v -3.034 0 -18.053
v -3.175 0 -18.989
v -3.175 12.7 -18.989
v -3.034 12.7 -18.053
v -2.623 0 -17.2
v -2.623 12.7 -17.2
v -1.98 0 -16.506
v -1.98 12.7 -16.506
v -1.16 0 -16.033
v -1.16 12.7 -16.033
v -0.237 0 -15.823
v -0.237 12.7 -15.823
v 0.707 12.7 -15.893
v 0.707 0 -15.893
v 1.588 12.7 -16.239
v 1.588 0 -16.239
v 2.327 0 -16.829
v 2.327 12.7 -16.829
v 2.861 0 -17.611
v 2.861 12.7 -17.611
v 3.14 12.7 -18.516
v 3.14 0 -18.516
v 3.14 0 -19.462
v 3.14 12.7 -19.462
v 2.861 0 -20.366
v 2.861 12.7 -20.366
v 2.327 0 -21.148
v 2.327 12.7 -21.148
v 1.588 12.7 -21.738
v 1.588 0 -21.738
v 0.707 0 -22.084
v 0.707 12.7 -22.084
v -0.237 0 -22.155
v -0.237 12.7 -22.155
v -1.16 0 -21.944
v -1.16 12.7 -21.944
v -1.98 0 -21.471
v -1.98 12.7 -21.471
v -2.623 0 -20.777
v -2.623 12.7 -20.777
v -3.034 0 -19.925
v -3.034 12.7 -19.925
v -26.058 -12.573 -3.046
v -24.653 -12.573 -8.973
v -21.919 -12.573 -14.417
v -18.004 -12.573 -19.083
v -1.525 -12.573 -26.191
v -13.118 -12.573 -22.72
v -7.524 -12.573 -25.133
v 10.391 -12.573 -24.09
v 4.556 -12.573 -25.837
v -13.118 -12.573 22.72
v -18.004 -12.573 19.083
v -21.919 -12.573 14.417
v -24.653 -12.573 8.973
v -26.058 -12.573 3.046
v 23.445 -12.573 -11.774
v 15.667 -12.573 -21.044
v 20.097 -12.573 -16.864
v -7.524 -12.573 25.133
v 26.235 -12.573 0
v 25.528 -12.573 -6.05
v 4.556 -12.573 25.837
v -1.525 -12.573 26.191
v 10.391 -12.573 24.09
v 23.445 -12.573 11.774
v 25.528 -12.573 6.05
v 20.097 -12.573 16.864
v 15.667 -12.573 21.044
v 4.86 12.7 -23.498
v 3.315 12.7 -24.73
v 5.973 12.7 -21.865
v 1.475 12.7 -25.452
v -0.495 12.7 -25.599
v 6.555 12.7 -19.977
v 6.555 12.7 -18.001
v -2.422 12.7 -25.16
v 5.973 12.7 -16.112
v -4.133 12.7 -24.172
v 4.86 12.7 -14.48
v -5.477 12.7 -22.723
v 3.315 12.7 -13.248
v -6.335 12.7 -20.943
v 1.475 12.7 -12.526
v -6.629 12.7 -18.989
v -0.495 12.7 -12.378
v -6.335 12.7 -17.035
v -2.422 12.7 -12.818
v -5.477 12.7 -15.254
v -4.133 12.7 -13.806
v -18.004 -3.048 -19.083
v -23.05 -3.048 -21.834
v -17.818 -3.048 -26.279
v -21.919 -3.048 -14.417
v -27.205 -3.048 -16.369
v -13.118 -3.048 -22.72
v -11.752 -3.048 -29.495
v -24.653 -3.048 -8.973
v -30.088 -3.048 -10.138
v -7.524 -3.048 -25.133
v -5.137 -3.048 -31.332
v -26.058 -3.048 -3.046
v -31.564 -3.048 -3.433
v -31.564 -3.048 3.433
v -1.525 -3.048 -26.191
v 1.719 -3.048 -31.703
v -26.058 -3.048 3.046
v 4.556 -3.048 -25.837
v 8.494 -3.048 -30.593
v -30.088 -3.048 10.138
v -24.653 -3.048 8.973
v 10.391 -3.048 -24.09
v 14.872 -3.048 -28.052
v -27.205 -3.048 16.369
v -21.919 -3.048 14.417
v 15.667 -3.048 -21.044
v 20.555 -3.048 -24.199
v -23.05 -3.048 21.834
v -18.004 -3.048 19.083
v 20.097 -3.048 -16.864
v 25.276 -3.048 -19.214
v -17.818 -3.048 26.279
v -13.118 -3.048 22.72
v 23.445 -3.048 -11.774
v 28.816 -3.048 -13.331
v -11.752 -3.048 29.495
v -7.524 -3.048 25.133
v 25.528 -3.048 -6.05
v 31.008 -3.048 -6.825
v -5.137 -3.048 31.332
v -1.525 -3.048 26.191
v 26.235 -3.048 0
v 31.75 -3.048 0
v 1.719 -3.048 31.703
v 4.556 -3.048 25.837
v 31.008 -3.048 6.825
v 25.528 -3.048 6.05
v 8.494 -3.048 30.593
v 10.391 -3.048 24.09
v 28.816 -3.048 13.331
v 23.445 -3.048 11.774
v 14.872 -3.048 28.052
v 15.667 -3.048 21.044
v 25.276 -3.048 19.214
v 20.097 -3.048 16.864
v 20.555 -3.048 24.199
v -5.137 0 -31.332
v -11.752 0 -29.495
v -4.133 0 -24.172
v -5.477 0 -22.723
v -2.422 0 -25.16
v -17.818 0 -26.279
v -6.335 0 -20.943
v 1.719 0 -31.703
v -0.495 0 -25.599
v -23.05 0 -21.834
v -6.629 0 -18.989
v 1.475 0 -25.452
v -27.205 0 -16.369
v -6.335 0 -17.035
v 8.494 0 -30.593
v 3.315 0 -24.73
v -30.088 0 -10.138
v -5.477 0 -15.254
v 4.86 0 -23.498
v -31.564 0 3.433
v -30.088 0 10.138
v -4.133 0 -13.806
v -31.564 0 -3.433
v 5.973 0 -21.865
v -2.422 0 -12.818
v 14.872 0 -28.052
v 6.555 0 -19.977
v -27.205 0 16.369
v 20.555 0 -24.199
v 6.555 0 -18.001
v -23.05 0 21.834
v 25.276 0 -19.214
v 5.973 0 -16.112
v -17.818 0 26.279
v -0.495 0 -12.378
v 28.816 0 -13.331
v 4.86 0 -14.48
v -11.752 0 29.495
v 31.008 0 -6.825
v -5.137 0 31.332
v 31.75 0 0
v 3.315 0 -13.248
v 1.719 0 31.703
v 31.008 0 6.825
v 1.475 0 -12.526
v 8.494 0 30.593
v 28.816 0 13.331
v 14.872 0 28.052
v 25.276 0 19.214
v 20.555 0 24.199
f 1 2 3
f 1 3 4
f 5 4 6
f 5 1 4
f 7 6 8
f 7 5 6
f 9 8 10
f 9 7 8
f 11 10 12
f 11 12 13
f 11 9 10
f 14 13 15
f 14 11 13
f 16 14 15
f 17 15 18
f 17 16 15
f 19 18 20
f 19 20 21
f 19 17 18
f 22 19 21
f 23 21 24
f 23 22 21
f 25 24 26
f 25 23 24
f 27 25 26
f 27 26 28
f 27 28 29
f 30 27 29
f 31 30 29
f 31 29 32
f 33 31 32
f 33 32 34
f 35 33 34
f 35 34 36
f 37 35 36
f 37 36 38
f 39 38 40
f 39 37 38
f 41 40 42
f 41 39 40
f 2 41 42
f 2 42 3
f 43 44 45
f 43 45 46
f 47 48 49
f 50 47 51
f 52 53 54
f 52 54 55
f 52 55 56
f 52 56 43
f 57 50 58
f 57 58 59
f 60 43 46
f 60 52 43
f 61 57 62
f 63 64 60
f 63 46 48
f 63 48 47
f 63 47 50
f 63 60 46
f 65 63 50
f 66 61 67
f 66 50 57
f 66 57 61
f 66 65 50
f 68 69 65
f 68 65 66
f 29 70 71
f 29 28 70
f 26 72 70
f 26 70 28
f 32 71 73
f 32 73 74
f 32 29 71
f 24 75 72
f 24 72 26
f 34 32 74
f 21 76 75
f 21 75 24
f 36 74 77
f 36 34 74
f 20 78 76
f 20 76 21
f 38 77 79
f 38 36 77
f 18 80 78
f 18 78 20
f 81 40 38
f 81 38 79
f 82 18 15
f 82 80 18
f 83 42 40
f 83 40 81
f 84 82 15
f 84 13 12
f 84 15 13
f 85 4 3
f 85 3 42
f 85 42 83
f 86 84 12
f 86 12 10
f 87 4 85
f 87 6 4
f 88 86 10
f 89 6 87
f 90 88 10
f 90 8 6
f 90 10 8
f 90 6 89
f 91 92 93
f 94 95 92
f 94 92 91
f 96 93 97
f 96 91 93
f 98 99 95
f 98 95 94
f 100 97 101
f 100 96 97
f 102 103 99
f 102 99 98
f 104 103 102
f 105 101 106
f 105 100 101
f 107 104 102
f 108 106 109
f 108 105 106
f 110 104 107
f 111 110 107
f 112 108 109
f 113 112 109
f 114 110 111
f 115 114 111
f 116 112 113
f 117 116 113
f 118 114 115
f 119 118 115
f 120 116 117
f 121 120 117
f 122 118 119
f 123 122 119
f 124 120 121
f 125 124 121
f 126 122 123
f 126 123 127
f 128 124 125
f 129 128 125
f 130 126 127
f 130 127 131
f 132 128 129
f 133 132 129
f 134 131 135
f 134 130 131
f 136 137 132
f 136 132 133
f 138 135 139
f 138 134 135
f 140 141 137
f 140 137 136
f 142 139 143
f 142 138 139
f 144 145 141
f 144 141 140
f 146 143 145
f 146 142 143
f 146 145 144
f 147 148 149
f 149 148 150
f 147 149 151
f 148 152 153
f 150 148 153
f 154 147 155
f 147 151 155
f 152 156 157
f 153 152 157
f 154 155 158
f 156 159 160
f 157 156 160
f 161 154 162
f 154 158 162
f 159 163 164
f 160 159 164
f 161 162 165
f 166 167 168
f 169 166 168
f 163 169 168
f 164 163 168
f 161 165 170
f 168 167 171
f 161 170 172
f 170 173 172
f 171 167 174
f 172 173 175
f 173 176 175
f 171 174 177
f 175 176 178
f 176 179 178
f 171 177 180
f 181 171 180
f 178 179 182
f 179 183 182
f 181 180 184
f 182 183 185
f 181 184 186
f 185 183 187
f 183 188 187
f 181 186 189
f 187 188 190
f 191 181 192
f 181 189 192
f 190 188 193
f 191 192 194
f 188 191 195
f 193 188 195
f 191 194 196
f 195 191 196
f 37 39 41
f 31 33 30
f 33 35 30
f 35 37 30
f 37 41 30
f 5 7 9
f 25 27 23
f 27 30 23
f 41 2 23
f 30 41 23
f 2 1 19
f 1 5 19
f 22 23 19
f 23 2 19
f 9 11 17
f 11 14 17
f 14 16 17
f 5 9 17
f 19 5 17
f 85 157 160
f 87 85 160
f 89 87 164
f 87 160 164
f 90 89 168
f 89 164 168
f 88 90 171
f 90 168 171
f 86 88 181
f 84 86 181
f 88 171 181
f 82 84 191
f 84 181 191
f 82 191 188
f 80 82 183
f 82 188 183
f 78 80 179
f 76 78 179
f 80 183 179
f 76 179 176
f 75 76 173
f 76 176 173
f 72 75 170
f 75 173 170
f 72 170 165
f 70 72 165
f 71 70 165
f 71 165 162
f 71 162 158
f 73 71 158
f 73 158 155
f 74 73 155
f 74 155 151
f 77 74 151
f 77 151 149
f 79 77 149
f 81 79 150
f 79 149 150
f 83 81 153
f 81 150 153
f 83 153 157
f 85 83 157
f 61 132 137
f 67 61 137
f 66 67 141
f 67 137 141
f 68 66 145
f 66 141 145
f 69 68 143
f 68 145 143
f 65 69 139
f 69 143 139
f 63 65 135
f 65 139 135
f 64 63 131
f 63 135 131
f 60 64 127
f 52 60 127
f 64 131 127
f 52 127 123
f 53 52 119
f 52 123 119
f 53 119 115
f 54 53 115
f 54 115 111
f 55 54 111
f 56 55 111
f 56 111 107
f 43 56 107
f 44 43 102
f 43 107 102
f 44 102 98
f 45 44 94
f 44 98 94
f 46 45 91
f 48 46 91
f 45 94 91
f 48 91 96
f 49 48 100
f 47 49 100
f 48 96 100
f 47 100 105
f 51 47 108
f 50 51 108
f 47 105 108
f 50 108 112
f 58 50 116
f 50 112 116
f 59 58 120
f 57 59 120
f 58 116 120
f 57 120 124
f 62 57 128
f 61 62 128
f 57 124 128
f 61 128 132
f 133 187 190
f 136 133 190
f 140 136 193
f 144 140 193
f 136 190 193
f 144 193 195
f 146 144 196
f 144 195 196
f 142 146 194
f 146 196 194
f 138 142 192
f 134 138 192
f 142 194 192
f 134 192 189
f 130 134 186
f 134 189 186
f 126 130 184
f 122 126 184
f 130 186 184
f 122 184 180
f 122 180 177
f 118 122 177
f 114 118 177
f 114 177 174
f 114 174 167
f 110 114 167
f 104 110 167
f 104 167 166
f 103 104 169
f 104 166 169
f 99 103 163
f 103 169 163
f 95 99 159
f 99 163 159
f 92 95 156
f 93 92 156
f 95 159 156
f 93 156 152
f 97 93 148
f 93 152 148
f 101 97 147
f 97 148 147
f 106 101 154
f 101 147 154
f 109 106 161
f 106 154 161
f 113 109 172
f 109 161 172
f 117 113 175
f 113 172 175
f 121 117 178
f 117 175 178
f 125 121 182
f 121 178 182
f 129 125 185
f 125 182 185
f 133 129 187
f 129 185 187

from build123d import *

# Parameters (mm, degrees)
F0_R     = 31.75
F1_DEPTH = 3.048
F2_R     = 26.235323
F3_DEPTH = 9.525
F4_R     = 6.629243
F4_R_2   = 3.175
F5_DEPTH = 12.7


with BuildPart() as f1:
    # F0 (on Front) → F1 (new body)
    with BuildSketch(Plane.XZ):
        Circle(F0_R)
    extrude(amount=F1_DEPTH)

    # F2 (on face) → F3 (join)
    with BuildSketch(Plane.XZ.offset(3.048)):
        Circle(F2_R)
    extrude(amount=F3_DEPTH)

    # F4 (on face) → F5 (join)
    with BuildSketch(Plane(origin=(0, 0, 0), x_dir=(-1, 0, 0), z_dir=(0, 1, 0))):
        with Locations((0, -18.988777)):
            Circle(F4_R)
        with Locations((0, -18.988777)):
            Circle(F4_R_2, mode=Mode.SUBTRACT)
    extrude(amount=F5_DEPTH)


solid = f1.part
